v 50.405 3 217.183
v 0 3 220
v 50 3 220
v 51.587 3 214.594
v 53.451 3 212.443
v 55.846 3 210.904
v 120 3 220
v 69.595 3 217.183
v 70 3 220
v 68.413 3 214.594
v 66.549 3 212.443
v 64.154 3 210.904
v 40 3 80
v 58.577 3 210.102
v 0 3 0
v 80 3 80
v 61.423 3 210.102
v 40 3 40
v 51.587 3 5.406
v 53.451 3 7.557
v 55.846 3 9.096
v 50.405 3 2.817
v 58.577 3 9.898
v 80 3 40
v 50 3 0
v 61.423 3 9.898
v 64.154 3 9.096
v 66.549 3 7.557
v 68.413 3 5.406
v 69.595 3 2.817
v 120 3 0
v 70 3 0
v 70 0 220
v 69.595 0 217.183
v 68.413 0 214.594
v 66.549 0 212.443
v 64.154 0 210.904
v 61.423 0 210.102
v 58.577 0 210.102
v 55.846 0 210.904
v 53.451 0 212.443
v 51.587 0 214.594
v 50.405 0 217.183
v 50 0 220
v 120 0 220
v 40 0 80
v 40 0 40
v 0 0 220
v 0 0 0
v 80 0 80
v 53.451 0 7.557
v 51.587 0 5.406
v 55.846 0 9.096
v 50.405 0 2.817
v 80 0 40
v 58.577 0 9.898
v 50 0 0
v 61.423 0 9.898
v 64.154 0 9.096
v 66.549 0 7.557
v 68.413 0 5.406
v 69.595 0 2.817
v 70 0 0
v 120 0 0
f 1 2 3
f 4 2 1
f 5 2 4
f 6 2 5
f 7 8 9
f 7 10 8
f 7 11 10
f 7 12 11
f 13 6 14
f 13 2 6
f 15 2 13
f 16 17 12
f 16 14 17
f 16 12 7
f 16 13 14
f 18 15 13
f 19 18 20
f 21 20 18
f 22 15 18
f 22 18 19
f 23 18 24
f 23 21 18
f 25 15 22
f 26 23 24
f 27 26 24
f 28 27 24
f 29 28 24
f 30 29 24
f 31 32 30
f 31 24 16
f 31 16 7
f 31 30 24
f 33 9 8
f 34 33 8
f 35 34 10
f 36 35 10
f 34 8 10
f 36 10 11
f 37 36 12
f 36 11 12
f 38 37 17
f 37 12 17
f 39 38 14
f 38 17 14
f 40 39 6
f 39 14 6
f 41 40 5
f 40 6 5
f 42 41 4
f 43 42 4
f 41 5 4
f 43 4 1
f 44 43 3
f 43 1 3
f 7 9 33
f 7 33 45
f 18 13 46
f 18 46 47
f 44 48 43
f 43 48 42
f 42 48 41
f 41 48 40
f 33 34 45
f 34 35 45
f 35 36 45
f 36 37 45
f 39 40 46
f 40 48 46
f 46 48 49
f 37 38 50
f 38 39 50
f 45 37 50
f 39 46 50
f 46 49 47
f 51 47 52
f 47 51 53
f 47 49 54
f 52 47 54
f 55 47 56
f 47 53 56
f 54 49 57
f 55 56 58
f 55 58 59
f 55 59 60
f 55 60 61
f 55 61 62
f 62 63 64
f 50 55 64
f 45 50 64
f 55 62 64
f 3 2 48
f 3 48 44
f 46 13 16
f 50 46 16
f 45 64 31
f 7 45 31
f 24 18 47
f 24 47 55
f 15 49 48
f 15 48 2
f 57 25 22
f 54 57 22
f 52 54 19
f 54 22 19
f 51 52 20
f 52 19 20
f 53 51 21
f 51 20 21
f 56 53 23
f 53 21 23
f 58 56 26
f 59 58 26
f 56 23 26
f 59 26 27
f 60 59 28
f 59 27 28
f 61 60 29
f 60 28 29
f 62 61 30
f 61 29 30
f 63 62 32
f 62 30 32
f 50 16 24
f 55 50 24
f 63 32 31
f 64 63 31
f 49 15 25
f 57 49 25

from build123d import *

# Parameters (mm, degrees)
SKETCH1_W           = 120
SKETCH1_H           = 3
BOSS_EXTRUDE1_DEPTH = 220
SKETCH2_R           = 10
CUT_EXTRUDE1_DEPTH  = 10
SKETCH4_W           = 40
SKETCH4_H           = 40
CUT_EXTRUDE2_DEPTH  = 10


with BuildPart() as part:
    # Sketch1 → Boss-Extrude1 (new body)
    with BuildSketch(Plane.XY):
        with Locations((60, 1.5)):
            Rectangle(SKETCH1_W, SKETCH1_H)
    extrude(amount=BOSS_EXTRUDE1_DEPTH)

    # Sketch2 → Cut-Extrude1 (cut)
    with BuildSketch(Plane(origin=(0, 3, 0), x_dir=(1, 0, 0), z_dir=(0, 1, 0))):
        with Locations((60, -220)):
            Circle(SKETCH2_R)
        with Locations((60, 0)):
            Circle(SKETCH2_R)
    extrude(amount=-CUT_EXTRUDE1_DEPTH, mode=Mode.SUBTRACT)

    # Sketch4 → Cut-Extrude2 (cut)
    with BuildSketch(Plane(origin=(0, 3, 0), x_dir=(1, 0, 0), z_dir=(0, 1, 0))):
        with Locations((60, -60)):
            Rectangle(SKETCH4_W, SKETCH4_H)
    extrude(amount=-CUT_EXTRUDE2_DEPTH, mode=Mode.SUBTRACT)


solid = part.part
